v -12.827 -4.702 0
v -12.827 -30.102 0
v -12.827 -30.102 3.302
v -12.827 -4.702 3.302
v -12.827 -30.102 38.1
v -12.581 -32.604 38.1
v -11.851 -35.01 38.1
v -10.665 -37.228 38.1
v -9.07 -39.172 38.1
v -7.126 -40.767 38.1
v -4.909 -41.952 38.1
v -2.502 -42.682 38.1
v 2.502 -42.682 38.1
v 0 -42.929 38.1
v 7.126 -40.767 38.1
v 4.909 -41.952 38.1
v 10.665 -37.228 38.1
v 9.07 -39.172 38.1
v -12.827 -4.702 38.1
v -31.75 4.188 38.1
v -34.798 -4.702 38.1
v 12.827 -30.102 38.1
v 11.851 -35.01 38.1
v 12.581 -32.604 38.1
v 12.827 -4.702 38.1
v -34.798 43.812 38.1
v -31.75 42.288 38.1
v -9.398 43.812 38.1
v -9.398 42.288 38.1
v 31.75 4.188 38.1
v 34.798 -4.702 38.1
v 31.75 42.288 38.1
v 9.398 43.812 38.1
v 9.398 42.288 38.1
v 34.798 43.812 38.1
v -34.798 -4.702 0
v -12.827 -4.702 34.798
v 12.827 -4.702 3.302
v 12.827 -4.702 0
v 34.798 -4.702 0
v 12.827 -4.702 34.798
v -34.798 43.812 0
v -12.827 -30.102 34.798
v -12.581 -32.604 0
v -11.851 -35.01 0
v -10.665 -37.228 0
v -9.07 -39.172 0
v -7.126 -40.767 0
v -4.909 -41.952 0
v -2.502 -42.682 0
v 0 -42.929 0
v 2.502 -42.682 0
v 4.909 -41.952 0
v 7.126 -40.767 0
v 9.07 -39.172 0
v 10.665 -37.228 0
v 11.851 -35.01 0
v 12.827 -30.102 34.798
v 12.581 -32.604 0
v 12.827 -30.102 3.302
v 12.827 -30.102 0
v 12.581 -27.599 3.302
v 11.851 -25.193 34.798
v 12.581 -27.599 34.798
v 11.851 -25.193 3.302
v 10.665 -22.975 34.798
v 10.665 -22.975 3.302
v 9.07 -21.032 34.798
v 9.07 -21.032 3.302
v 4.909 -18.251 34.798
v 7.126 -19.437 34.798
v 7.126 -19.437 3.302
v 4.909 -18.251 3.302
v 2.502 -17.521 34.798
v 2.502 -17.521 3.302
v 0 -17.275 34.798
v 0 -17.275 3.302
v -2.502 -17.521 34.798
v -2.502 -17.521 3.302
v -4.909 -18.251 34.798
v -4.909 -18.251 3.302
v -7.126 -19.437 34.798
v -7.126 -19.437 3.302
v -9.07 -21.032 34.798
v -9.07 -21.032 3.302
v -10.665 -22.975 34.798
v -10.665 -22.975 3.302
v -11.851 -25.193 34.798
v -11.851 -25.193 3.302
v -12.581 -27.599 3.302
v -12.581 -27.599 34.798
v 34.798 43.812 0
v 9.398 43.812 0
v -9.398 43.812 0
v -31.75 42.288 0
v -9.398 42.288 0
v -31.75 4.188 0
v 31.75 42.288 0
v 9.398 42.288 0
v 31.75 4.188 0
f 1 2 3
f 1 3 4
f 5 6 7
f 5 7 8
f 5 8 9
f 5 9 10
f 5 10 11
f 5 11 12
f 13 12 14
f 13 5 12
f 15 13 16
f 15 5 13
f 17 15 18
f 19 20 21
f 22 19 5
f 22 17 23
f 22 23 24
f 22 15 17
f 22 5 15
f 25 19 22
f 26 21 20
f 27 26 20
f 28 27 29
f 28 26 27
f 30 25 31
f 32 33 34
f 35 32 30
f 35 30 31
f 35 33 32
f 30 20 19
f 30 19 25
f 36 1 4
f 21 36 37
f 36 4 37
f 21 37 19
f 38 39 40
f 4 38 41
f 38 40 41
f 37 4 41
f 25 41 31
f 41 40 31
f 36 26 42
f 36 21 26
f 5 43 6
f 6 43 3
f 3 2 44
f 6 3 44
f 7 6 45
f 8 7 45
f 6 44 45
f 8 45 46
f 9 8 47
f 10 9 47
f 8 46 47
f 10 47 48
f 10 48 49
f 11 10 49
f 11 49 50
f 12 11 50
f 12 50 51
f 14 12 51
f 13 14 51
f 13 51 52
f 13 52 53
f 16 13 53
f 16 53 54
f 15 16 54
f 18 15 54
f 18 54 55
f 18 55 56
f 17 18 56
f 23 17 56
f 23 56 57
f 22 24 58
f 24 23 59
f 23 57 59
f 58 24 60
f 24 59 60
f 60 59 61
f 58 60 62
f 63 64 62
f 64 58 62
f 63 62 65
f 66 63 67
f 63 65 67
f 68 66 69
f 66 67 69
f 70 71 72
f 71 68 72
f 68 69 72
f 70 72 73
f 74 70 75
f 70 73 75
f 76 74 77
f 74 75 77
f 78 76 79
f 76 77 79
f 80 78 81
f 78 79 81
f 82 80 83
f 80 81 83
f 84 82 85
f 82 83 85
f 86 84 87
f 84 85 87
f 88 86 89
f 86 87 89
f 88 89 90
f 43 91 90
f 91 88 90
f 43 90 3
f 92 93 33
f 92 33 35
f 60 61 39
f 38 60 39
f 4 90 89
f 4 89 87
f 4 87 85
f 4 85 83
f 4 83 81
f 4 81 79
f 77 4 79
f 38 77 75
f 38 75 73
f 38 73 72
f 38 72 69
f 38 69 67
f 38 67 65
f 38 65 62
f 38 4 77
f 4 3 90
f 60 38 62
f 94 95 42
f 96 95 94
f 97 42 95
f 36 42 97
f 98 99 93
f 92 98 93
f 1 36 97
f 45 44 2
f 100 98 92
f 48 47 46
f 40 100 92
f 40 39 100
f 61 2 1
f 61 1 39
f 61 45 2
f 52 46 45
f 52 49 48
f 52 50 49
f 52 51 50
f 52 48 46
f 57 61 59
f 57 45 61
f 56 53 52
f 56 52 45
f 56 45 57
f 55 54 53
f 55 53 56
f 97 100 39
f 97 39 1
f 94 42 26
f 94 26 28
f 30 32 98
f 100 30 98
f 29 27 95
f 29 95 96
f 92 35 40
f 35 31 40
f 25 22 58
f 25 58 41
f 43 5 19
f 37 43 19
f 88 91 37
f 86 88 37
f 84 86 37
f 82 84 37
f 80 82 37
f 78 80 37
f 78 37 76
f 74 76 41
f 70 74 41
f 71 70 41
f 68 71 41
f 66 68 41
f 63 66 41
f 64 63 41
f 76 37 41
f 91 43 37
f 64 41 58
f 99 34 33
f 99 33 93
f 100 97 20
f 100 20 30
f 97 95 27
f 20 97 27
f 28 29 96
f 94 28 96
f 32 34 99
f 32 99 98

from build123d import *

# Parameters (mm, degrees)
SKETCH1_R            = 12.827
BOSS_EXTRUDE1_DEPTH  = 38.1
SKETCH2_W            = 25.654
SKETCH2_H            = 25.4
BOSS_EXTRUDE2_DEPTH  = 3.302
SKETCH8_W            = 63.5
SKETCH8_H            = 38.1
BOSS_EXTRUDE6_DEPTH  = 8.89
SKETCH10_W           = 38.1
SKETCH10_H           = 46.99
BOSS_EXTRUDE7_DEPTH  = 3.048
SKETCH11_W           = 38.1
SKETCH11_H           = 46.99
BOSS_EXTRUDE8_DEPTH  = 3.048
SKETCH13_W           = 25.4
SKETCH13_H           = 38.1
BOSS_EXTRUDE9_DEPTH  = 1.524
SKETCH14_W           = 25.4
SKETCH14_H           = 38.1
BOSS_EXTRUDE10_DEPTH = 1.524
SKETCH16_W           = 25.654
SKETCH16_H           = 25.4
BOSS_EXTRUDE12_DEPTH = 3.302


with BuildPart() as part:
    # Sketch1 → Boss-Extrude1 (new body)
    with BuildSketch(Plane.XY):
        with Locations(Location((0, -30.101764051, 0), (0, 0, 180))):
            Circle(SKETCH1_R)
    extrude(amount=BOSS_EXTRUDE1_DEPTH)

    # Sketch2 → Boss-Extrude2 (add)
    with BuildSketch(Plane.XY):
        with Locations((0, -17.401764051)):
            Rectangle(SKETCH2_W, SKETCH2_H)
    extrude(amount=BOSS_EXTRUDE2_DEPTH)

    # Sketch8 → Boss-Extrude6 (add)
    with BuildSketch(Plane(origin=(0, -4.701764051, 0), x_dir=(1, 0, 0), z_dir=(0, 1, 0))):
        with Locations((0, -19.05)):
            Rectangle(SKETCH8_W, SKETCH8_H)
    extrude(amount=BOSS_EXTRUDE6_DEPTH)

    # Sketch10 → Boss-Extrude7 (add)
    with BuildSketch(Plane(origin=(31.75, 0, 0), x_dir=(0, 0, -1), z_dir=(1, 0, 0))):
        with Locations((-19.05, 18.793235949)):
            Rectangle(SKETCH10_W, SKETCH10_H)
    extrude(amount=BOSS_EXTRUDE7_DEPTH)

    # Sketch11 → Boss-Extrude8 (add)
    with BuildSketch(Plane.ZY.offset(31.75)):
        with Locations((19.05, 18.793235949)):
            Rectangle(SKETCH11_W, SKETCH11_H)
    extrude(amount=BOSS_EXTRUDE8_DEPTH)

    # Sketch13 → Boss-Extrude9 (add)
    with BuildSketch(Plane(origin=(0, 42.288235949, 0), x_dir=(1, 0, 0), z_dir=(0, 1, 0))):
        with Locations((22.098, -19.05)):
            Rectangle(SKETCH13_W, SKETCH13_H)
    extrude(amount=BOSS_EXTRUDE9_DEPTH)

    # Sketch14 → Boss-Extrude10 (add)
    with BuildSketch(Plane(origin=(0, 42.288235949, 0), x_dir=(1, 0, 0), z_dir=(0, 1, 0))):
        with Locations((-22.098, -19.05)):
            Rectangle(SKETCH14_W, SKETCH14_H)
    extrude(amount=BOSS_EXTRUDE10_DEPTH)

    # Sketch16 → Boss-Extrude12 (add)
    with BuildSketch(Plane.XY.offset(38.1)):
        with Locations((0, -17.401764051)):
            Rectangle(SKETCH16_W, SKETCH16_H)
    extrude(amount=-BOSS_EXTRUDE12_DEPTH)


solid = part.part
